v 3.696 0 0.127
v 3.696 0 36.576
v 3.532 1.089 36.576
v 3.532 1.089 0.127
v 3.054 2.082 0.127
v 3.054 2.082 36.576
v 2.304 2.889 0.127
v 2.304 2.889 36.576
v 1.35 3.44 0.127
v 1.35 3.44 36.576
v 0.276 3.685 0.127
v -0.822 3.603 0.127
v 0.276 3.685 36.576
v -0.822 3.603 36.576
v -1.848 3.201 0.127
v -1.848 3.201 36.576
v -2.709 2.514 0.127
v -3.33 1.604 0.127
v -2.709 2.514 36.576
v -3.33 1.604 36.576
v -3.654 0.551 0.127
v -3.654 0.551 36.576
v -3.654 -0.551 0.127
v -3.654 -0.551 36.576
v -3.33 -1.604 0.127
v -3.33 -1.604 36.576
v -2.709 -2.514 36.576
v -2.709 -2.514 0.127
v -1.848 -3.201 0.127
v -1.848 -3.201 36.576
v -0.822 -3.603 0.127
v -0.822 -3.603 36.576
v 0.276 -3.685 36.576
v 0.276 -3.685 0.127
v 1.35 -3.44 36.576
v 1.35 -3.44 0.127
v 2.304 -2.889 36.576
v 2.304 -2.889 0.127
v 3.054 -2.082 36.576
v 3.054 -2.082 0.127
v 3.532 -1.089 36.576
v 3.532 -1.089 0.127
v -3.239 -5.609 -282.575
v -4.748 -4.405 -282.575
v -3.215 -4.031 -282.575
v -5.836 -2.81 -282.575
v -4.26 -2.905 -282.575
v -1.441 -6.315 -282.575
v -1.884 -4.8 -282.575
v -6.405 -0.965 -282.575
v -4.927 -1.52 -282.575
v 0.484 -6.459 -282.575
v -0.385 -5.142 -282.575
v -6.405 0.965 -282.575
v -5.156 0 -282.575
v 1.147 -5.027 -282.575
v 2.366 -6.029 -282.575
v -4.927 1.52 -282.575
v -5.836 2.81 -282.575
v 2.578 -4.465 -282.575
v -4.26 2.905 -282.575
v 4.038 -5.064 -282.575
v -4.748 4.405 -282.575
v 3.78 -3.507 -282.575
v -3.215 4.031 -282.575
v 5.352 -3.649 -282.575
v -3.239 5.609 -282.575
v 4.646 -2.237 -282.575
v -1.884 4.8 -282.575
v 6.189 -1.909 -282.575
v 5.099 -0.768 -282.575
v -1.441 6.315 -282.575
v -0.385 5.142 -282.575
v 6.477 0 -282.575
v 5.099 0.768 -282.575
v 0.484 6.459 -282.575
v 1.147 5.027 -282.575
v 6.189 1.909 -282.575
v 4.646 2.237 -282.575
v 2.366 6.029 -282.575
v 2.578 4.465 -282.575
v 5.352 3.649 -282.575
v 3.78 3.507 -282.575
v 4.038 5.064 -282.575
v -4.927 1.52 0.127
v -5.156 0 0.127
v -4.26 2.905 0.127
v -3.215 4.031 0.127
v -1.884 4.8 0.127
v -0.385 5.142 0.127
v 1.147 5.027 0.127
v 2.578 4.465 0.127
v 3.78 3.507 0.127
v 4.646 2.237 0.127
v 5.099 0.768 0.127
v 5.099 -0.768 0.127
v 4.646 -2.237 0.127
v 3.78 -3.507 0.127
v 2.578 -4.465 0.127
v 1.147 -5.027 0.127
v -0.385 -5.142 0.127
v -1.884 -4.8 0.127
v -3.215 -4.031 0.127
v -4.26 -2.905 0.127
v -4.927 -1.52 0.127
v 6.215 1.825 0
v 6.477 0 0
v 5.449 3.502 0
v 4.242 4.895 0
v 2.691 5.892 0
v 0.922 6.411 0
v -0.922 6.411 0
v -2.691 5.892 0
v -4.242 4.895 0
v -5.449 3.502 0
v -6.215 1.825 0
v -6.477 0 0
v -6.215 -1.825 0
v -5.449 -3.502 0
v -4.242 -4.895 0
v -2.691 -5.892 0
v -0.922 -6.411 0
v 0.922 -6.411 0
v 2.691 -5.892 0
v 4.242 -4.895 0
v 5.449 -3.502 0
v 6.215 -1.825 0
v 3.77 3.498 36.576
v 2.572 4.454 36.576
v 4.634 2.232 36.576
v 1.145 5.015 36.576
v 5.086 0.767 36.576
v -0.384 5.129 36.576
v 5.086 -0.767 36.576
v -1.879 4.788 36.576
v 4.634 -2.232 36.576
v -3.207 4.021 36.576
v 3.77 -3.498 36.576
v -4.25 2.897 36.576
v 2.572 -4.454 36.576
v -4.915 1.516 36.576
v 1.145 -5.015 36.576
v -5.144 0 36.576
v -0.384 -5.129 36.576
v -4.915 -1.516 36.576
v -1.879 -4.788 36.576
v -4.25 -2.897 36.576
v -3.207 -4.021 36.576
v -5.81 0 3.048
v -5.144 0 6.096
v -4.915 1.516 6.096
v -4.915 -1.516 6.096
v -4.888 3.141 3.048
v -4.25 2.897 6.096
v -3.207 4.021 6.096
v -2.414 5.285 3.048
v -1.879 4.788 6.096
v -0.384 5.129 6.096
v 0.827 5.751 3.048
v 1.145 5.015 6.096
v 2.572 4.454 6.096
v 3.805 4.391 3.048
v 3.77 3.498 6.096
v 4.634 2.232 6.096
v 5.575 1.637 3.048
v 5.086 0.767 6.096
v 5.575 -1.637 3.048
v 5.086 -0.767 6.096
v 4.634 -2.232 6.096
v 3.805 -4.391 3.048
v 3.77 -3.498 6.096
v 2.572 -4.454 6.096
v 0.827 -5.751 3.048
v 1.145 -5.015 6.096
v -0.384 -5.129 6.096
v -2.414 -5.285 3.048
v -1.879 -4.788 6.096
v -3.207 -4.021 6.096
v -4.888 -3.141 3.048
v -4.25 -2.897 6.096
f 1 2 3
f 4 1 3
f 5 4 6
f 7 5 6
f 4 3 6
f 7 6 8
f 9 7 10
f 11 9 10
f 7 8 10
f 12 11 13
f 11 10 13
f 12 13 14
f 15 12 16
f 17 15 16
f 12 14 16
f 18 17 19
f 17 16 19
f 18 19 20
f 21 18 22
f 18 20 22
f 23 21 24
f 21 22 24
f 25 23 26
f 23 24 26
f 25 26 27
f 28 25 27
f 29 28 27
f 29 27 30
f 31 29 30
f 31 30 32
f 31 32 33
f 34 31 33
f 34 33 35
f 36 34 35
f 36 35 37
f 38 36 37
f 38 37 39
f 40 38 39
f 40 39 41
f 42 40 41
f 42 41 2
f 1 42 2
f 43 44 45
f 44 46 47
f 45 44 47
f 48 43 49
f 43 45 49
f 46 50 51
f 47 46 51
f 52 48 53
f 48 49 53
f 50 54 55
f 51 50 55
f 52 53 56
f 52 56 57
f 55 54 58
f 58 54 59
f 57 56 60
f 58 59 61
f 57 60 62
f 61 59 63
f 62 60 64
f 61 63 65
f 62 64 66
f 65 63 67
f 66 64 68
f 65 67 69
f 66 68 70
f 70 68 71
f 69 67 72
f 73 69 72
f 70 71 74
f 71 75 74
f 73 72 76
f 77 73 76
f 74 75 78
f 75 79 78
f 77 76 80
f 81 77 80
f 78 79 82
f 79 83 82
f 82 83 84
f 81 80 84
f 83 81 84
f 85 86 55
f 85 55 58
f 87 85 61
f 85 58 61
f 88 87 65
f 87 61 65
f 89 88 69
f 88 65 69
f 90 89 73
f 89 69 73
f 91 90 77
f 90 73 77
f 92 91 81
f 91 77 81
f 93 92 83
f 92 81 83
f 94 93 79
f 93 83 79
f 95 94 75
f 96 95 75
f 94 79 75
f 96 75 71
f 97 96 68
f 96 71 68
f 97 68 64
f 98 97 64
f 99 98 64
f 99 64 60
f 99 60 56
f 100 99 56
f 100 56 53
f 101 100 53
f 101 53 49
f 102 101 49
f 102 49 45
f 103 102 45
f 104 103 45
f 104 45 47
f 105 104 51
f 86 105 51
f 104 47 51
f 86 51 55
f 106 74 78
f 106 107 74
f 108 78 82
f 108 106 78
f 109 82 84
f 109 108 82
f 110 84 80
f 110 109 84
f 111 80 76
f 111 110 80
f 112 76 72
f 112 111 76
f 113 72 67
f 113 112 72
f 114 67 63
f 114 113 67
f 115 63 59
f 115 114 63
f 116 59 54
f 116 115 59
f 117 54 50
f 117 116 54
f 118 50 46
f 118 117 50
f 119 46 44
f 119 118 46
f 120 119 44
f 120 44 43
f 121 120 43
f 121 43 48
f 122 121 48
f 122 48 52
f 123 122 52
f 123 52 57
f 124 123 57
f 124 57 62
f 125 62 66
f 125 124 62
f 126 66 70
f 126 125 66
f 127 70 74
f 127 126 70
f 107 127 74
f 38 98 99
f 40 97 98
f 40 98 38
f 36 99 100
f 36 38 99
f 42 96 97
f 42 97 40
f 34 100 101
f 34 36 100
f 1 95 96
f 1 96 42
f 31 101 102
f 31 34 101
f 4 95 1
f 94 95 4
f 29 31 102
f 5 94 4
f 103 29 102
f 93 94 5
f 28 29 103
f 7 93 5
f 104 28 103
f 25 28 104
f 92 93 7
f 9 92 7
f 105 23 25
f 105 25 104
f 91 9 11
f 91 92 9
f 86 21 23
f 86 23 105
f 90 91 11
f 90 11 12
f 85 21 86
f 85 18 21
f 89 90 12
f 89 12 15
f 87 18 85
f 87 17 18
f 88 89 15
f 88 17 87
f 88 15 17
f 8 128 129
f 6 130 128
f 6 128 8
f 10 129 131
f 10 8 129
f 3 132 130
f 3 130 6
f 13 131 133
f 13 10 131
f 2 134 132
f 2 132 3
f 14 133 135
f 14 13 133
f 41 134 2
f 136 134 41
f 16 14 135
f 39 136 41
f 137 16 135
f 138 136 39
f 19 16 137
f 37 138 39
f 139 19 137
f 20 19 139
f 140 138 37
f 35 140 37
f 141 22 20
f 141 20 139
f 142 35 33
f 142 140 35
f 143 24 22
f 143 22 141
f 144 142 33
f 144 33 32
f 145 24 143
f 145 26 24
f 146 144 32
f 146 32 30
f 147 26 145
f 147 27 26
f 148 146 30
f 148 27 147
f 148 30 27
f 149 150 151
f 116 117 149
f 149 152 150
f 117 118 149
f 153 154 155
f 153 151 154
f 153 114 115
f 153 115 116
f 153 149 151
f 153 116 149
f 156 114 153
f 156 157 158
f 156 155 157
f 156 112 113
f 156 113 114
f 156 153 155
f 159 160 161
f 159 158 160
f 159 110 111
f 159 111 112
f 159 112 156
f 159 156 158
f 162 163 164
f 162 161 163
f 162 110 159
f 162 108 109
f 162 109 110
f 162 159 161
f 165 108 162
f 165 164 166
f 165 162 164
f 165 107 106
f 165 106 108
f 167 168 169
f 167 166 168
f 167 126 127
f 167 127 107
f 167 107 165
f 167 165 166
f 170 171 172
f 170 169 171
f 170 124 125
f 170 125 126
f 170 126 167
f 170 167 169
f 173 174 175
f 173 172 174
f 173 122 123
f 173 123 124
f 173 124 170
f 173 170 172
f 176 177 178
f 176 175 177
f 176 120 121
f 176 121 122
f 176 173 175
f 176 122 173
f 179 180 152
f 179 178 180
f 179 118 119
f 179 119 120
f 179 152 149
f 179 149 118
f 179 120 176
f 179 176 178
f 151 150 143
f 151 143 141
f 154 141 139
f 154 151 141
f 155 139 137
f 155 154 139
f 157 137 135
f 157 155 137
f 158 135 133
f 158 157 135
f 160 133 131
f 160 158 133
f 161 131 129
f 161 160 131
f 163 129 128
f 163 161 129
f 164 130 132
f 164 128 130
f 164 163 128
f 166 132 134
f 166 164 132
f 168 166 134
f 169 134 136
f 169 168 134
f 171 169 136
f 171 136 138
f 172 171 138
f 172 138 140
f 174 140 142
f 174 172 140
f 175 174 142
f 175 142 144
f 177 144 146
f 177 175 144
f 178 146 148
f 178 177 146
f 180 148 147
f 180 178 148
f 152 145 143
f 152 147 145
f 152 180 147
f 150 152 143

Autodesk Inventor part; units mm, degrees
ref_plane "YZ Plane" through (0, 0, 0) normal (1, 0, 0) x (0, 1, 0)
ref_plane "XZ Plane" through (0, 0, 0) normal (0, 1, 0) x (-1, 0, 0)
ref_plane "XY Plane" through (0, 0, 0) normal (0, 0, 1) x (1, 0, 0)
sketch "Sketch1" plane through (0, 0, 0) normal (0, 0, 1) x (1, 0, 0)
  circle A0 centre (0, 0) radius 6.477
  dimension "d0" = 12.954
extrude "Extrusion1" add sketch "Sketch1" against normal blind 282.575
sketch "Sketch3" plane through (0, 0, 0) normal (0, 1, 0) x (-1, 0, 0)
  line L0 (-6.477, -282.575) -> (6.477, -282.575) projected
  line L1 (-6.477, 0) -> (6.477, 0) projected
  line L2 (6.477, 0) -> (6.477, -282.575) projected
  line L3 (-6.477, 0) -> (-6.477, -282.575) projected
  line L4 (0, 0) -> (0, 36.576)
  line L5 (5.1435, 36.576) -> (5.1435, 6.096)
  line L6 (0, 36.576) -> (5.1435, 36.576)
  line L7 (5.1435, 6.096) -> (6.477, 0)
  line L8 (6.477, 0) -> (0, 0)
  dimension "d3" = 36.576
  dimension "d4" = 5.1435
  dimension "d5" = 30.48
revolve "Revolution1" add sketch "Sketch3" angle 360 about axis through (0, 0, 0) along (0, 0, 1) contours L1 L4 L6 L5 L7
sketch "Sketch4" plane through (0, 0, 36.576) normal (0, 0, 1) x (1, 0, 0)
  circle A0 centre (0, 0) radius 5.1435 projected
  circle A1 centre (0, 0) radius 3.6957
  dimension "d7" = 7.3914
extrude "Extrusion2" cut sketch "Sketch4" against normal blind 36.576 contours A1
sketch "Sketch5" plane through (0, 0, -282.575) normal (0, 0, -1) x (-1, 0, 0)
  circle A0 centre (0, 0) radius 6.477 projected
  circle A1 centre (0, 0) radius 5.1562
  dimension "d10" = 10.3124
extrude "Extrusion3" cut sketch "Sketch5" against normal blind 282.702 contours A1
properties part number "Cane Segment"
